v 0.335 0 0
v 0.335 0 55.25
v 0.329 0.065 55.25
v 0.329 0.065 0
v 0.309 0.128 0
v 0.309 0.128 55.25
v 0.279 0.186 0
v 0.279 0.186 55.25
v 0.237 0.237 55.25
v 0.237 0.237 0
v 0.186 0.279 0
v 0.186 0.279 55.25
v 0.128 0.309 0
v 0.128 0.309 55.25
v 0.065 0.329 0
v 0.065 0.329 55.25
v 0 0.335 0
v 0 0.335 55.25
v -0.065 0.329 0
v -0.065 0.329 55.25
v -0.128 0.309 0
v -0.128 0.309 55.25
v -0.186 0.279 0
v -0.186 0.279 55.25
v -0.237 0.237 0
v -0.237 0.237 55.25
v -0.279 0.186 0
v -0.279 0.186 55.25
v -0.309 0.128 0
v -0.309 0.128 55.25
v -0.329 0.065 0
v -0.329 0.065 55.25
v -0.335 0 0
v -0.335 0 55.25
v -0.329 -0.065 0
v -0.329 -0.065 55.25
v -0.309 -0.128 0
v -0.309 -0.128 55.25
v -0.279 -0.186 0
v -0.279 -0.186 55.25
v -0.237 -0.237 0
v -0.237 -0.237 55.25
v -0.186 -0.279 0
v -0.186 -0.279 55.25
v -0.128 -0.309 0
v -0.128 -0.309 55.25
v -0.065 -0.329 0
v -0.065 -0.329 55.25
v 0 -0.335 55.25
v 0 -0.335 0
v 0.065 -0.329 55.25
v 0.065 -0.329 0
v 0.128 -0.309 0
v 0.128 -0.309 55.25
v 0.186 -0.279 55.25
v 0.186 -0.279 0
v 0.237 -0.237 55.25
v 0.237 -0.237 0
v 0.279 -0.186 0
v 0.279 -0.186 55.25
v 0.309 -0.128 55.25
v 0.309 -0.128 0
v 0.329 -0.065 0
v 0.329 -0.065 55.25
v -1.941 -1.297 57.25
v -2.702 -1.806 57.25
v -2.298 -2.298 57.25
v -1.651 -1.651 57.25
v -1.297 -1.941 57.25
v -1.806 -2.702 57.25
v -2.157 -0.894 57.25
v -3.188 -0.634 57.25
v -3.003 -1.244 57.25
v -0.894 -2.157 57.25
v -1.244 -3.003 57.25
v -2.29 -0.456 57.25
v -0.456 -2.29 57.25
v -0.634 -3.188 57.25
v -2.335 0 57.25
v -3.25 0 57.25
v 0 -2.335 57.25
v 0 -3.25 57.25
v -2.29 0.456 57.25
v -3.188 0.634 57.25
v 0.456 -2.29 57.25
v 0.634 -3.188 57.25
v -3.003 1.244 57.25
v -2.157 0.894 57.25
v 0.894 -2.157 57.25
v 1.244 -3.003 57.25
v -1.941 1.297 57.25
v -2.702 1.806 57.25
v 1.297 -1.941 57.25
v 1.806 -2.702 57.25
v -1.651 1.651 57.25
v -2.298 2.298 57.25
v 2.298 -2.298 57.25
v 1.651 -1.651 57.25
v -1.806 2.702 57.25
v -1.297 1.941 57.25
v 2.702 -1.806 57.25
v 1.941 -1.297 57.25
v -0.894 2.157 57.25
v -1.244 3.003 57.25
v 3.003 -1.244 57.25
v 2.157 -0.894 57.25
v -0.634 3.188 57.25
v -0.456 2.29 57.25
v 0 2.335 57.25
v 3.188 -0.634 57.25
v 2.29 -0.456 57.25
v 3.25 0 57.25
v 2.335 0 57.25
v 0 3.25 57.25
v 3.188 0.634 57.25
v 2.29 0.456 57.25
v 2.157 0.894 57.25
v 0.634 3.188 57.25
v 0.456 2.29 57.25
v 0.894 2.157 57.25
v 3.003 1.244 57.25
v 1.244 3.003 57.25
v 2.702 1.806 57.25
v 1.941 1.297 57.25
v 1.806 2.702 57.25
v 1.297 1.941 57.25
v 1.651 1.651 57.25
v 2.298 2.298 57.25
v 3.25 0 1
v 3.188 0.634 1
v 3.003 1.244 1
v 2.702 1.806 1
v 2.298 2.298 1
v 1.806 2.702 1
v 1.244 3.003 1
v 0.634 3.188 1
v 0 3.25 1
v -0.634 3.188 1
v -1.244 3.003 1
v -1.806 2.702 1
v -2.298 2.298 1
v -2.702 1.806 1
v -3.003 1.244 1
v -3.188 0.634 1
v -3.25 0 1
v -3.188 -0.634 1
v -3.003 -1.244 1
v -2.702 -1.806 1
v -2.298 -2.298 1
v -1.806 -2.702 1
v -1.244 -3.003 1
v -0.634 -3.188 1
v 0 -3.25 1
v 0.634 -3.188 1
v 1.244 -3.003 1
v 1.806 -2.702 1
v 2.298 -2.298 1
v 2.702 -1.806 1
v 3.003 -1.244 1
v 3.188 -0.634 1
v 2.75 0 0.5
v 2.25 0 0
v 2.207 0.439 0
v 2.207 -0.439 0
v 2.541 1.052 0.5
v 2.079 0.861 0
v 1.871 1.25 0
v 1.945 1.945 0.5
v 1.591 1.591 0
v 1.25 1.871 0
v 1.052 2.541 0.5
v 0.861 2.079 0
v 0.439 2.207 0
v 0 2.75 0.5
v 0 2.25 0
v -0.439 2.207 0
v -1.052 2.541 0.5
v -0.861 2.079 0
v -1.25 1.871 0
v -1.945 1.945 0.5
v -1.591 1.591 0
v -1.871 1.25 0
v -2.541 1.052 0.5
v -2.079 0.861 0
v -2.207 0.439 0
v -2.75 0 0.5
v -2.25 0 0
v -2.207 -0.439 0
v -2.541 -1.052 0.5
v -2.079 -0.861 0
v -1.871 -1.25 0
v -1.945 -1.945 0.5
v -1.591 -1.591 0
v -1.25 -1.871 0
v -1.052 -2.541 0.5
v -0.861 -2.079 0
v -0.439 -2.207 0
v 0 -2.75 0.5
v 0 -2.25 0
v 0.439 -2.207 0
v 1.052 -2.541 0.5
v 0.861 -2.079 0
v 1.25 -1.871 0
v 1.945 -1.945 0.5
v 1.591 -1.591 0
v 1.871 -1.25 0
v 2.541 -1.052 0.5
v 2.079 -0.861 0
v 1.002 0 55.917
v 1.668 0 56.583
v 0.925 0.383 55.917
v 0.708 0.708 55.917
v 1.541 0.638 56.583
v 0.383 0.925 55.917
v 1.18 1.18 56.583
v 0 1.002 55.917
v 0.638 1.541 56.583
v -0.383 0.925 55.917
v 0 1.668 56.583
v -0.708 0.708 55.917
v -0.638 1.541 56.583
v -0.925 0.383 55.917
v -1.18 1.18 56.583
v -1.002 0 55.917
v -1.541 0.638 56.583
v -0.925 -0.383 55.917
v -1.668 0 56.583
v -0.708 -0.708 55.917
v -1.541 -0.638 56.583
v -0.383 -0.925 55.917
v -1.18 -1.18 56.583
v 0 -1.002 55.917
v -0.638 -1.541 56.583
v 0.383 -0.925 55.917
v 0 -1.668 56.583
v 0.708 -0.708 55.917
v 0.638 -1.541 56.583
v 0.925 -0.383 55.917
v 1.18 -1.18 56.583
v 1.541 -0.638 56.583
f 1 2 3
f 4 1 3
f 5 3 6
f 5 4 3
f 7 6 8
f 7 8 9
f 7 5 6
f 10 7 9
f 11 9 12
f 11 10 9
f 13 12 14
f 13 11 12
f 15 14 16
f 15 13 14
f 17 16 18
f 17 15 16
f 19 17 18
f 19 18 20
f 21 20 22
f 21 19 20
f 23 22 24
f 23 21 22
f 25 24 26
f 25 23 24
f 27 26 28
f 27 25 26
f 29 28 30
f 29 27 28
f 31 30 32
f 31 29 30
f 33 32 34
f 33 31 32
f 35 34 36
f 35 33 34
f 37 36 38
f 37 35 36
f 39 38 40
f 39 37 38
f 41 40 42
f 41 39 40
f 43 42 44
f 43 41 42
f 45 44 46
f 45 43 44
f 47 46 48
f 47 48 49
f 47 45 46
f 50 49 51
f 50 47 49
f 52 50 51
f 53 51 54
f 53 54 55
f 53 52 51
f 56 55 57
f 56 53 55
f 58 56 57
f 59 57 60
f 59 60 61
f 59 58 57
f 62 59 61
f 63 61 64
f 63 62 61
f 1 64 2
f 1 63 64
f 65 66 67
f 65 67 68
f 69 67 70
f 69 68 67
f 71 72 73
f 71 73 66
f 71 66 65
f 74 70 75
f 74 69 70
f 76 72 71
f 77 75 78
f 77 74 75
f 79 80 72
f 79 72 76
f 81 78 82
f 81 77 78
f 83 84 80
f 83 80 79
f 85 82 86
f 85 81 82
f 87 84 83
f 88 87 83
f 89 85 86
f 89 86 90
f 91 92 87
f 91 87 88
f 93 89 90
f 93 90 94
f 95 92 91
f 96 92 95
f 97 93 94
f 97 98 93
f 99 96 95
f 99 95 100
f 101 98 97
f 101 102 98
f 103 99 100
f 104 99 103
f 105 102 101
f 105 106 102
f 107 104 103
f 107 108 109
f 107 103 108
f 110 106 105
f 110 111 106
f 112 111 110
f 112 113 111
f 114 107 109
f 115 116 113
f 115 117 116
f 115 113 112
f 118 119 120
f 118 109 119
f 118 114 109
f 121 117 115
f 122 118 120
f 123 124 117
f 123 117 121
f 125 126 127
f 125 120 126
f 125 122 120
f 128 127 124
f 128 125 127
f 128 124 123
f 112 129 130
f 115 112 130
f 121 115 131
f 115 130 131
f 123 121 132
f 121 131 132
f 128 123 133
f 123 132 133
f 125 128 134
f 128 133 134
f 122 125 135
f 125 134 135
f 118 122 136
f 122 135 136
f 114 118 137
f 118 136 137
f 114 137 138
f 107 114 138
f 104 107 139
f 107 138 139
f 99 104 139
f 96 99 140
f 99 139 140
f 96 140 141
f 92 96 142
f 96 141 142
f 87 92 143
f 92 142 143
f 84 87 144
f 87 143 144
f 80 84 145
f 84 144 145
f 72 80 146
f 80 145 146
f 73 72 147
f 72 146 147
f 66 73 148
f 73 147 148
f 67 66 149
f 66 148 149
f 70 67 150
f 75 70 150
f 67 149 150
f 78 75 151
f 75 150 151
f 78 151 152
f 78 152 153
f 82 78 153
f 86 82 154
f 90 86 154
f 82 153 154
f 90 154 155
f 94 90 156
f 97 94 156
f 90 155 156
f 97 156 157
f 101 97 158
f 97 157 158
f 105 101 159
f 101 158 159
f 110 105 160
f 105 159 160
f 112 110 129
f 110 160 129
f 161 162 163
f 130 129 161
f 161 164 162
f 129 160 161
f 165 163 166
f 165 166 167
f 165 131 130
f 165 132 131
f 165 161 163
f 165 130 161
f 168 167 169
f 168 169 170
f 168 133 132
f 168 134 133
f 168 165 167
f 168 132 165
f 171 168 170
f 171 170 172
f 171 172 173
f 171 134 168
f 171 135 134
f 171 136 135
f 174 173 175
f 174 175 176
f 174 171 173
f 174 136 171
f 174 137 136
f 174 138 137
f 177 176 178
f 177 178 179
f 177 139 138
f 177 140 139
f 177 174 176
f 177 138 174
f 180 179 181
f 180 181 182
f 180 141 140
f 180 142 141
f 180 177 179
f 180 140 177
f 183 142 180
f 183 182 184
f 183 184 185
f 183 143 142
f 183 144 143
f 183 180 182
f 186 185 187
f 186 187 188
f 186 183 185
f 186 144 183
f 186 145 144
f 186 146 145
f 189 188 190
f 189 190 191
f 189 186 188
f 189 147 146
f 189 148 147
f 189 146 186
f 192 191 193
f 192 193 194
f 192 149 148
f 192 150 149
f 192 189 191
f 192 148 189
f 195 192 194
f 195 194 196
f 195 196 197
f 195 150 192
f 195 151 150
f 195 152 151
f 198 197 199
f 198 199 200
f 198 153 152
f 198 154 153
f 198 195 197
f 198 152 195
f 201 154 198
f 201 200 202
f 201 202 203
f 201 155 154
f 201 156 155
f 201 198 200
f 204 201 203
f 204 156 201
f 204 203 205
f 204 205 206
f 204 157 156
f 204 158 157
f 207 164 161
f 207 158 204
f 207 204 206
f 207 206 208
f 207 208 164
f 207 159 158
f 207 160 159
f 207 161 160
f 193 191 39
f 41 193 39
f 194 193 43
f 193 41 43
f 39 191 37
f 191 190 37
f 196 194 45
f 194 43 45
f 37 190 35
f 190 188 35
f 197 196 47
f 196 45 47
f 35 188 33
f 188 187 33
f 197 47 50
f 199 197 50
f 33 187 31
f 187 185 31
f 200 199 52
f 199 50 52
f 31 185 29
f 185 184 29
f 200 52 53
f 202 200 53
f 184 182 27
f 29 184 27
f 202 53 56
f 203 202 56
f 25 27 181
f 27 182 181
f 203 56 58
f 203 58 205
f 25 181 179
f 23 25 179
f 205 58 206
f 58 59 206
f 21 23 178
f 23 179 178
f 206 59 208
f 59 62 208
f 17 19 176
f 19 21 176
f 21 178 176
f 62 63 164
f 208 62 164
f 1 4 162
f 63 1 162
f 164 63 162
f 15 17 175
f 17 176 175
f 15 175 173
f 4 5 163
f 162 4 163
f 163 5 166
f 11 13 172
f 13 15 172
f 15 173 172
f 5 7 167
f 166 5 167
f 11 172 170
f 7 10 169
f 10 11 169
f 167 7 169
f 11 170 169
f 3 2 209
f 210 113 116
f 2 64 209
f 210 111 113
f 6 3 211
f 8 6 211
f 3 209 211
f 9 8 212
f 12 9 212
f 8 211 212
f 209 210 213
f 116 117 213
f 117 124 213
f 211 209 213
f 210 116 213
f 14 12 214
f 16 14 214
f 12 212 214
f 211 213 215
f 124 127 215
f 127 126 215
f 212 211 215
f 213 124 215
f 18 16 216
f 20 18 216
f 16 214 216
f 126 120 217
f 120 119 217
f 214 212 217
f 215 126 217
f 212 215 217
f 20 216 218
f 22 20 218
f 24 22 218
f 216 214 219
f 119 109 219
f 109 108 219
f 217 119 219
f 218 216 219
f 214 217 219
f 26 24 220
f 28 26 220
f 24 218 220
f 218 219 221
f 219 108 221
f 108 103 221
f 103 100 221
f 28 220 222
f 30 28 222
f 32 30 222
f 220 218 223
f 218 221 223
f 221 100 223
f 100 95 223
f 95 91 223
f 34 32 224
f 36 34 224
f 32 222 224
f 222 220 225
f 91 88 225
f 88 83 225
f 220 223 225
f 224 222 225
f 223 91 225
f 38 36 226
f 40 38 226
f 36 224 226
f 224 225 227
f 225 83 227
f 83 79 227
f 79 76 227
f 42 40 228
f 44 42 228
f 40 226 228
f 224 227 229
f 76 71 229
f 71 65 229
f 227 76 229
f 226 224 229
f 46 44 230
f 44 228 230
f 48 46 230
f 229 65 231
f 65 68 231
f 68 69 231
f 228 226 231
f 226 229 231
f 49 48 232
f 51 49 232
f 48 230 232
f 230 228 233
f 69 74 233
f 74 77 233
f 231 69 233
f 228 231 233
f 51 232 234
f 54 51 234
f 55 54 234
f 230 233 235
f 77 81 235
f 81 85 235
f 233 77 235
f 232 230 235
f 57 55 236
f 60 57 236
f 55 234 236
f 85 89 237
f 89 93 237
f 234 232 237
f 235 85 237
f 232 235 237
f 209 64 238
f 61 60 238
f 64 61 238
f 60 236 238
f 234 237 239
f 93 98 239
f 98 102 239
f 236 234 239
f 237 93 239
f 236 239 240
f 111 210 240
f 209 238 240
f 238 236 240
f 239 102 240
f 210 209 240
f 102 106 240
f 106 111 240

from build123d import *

# Parameters (mm, degrees)
F0_R     = 3.25
F0_R_2   = 0.335
F1_DEPTH = 57.25
F2_SIZE  = 2
F3_SIZE  = 1


with BuildPart() as f1:
    # F0 (on Top) → F1 (new body)
    with BuildSketch(Plane.XY):
        Circle(F0_R)
        Circle(F0_R_2, mode=Mode.SUBTRACT)
    extrude(amount=F1_DEPTH)

    # F2
    f2_edges = [f1.edges().sort_by_distance(p)[0] for p in [
        (-0.335, 0, 57.25),
    ]]
    chamfer(f2_edges, length=F2_SIZE)

    # F3
    f3_edges = [f1.edges().sort_by_distance(p)[0] for p in [
        (-3.25, 0, 0),
    ]]
    chamfer(f3_edges, length=F3_SIZE)


solid = f1.part
